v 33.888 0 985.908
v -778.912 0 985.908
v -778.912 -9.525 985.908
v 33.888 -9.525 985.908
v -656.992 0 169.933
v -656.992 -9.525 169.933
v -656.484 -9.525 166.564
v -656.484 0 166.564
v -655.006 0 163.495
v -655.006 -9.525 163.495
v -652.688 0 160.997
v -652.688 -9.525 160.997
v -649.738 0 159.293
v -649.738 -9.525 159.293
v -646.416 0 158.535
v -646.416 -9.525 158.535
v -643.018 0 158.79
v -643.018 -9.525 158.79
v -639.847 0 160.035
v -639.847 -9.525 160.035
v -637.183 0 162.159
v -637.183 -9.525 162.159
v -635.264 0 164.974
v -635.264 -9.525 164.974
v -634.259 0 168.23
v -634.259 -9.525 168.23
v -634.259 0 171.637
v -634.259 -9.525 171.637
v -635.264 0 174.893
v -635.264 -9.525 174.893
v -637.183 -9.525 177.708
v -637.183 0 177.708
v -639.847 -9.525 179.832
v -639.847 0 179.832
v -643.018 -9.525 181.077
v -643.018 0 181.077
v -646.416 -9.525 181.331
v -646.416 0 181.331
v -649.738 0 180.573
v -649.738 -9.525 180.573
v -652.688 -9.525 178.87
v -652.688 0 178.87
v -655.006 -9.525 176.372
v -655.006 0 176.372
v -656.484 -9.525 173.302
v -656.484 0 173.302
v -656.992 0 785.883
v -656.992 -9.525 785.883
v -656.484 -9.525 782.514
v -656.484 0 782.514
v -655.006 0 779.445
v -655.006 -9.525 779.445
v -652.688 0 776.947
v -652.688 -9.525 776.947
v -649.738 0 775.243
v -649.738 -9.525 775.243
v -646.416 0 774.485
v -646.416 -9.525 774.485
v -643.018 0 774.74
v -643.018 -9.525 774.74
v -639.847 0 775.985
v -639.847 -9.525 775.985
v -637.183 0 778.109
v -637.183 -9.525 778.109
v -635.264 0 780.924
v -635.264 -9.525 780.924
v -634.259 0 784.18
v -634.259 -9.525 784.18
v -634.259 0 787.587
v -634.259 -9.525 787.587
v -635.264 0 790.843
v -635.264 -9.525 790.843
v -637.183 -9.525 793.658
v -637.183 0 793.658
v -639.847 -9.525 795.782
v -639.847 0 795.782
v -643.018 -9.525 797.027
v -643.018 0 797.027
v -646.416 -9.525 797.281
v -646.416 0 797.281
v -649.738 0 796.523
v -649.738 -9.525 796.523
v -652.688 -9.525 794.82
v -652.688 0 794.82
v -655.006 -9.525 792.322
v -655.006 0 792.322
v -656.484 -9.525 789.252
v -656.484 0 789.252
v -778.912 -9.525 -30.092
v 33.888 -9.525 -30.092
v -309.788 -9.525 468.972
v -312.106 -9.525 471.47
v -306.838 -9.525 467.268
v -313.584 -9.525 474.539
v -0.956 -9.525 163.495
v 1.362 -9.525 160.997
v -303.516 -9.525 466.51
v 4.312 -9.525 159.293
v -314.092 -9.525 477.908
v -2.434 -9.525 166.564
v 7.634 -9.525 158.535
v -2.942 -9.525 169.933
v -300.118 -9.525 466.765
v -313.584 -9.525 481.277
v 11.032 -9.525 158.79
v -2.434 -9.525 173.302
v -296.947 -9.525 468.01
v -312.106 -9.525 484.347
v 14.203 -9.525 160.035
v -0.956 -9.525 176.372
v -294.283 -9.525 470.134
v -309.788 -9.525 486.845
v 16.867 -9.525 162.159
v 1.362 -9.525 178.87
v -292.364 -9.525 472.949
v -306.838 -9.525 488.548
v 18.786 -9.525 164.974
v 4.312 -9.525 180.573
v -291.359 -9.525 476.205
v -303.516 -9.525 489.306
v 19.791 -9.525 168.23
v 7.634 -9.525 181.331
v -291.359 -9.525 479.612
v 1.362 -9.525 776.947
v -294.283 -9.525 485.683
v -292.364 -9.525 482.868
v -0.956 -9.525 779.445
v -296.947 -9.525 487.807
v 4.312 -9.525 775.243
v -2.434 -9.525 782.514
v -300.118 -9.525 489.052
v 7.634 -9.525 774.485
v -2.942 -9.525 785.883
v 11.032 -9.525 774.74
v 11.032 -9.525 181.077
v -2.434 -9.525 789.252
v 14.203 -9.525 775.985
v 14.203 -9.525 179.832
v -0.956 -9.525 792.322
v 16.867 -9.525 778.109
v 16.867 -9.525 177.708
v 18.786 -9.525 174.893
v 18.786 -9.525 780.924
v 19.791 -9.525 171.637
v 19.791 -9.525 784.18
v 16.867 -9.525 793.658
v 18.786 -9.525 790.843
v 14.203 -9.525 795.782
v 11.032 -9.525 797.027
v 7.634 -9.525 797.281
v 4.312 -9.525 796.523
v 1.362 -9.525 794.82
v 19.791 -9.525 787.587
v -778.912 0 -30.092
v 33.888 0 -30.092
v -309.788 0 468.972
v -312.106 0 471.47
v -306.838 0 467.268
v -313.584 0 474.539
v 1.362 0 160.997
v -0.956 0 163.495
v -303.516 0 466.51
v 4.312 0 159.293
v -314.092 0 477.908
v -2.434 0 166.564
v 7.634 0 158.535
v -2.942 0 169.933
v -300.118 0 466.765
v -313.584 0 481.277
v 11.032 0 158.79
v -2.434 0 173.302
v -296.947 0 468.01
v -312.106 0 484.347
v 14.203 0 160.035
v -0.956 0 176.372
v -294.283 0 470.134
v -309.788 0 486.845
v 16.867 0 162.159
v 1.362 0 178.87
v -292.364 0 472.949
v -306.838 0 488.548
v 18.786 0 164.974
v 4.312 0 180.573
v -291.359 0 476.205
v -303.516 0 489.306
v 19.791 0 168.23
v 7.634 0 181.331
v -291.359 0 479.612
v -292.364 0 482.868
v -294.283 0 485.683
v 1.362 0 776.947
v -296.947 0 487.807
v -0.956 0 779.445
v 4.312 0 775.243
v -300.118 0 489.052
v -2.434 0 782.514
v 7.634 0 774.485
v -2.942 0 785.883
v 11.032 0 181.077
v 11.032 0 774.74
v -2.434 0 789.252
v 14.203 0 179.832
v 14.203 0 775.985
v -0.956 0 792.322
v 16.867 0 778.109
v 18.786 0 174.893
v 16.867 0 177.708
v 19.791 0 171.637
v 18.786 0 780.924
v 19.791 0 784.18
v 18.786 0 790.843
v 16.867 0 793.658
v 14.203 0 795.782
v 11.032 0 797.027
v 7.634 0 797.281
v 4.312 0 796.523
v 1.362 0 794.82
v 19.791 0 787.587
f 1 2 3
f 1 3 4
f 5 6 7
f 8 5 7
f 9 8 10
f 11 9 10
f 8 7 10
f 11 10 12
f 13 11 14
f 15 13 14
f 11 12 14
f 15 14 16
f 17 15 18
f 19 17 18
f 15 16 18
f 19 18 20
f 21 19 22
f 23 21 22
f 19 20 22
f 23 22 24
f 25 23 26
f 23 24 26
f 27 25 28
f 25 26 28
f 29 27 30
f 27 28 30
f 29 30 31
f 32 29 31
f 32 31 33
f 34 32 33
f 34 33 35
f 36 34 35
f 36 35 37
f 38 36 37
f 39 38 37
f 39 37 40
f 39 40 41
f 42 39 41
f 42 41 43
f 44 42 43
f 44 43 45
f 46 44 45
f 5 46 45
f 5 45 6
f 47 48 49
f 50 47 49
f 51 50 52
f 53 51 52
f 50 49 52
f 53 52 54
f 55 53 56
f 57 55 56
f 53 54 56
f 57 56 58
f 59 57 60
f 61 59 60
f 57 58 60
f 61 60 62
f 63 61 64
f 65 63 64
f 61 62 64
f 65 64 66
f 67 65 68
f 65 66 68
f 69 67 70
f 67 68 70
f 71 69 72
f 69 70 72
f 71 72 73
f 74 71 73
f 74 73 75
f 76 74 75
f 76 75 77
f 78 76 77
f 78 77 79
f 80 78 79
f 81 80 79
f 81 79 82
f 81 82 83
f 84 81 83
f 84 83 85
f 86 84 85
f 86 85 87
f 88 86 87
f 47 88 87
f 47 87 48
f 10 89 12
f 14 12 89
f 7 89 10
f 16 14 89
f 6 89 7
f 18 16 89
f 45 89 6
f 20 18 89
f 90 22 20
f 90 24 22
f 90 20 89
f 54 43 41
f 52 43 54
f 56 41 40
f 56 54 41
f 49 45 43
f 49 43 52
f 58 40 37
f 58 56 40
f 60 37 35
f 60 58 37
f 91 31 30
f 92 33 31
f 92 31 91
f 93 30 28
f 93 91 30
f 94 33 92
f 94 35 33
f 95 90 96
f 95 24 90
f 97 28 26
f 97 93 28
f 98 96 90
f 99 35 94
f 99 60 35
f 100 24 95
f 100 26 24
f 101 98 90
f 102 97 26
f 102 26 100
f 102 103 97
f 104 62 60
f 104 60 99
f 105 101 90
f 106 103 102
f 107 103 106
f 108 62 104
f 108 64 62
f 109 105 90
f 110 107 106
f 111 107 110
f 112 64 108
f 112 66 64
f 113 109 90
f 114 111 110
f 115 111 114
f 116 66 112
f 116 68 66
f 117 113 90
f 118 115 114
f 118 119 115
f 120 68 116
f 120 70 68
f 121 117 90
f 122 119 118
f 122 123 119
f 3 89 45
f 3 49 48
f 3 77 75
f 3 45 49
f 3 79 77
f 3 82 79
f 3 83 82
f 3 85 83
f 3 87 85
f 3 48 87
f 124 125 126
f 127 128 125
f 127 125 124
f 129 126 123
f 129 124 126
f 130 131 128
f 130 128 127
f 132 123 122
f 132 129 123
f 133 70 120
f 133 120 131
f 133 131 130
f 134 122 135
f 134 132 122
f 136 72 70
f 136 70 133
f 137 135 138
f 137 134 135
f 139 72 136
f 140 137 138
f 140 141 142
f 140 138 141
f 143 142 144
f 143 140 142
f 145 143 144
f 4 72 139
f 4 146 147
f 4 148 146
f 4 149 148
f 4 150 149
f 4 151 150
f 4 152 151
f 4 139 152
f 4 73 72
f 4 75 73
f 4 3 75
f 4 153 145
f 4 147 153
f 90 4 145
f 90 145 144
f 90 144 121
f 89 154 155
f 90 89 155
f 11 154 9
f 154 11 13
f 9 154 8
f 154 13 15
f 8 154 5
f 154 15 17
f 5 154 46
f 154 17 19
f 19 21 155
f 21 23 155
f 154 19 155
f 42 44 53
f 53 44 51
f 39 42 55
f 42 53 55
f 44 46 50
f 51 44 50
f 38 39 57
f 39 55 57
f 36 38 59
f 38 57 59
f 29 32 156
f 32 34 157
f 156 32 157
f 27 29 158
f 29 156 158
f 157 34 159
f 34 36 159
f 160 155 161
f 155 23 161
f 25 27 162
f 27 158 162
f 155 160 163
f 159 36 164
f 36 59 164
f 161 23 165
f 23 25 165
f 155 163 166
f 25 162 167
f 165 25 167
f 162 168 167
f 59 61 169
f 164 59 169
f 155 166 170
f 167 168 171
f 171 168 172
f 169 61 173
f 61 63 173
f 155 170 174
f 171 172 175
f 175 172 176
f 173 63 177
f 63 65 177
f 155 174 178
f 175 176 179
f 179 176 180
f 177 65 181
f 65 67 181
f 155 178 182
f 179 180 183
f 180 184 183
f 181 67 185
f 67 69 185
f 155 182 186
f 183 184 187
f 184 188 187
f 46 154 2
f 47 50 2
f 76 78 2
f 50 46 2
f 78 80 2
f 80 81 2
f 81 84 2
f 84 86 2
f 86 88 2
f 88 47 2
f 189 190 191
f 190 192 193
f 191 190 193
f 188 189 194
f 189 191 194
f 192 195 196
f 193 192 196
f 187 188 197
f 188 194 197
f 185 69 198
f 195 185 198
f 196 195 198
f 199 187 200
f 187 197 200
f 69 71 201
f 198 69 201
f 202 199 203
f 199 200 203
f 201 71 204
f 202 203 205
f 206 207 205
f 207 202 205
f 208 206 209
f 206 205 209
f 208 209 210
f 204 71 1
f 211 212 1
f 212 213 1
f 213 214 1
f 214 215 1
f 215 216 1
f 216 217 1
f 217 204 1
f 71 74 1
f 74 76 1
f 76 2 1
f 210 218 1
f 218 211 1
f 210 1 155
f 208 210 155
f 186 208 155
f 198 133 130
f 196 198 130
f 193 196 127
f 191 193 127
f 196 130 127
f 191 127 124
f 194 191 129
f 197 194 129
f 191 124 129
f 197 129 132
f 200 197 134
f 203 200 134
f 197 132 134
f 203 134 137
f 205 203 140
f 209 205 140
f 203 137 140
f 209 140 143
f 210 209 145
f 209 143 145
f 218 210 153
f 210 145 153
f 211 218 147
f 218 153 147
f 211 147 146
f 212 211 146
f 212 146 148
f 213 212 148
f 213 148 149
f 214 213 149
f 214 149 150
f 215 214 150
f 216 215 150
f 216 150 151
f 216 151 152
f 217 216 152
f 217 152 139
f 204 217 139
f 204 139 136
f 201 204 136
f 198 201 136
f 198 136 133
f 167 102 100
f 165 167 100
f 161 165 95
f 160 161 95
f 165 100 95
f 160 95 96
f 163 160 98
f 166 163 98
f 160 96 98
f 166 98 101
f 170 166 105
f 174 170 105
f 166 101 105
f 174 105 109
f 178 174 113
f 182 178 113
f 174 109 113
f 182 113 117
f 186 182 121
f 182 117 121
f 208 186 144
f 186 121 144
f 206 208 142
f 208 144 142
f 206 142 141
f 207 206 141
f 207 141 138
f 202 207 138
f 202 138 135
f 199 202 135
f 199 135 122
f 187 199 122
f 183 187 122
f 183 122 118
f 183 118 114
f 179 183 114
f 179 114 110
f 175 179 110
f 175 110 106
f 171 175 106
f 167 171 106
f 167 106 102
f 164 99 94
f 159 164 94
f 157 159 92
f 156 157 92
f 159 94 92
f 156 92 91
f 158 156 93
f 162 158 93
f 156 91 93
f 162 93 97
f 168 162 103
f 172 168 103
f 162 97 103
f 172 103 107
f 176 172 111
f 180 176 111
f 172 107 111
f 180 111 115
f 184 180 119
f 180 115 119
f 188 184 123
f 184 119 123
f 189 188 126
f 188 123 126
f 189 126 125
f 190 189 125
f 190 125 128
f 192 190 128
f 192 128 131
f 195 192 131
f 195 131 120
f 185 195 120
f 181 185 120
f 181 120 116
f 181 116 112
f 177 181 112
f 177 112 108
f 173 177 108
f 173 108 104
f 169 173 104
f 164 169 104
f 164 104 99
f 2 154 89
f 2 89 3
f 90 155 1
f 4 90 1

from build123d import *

# Parameters (mm, degrees)
F0_W     = 812.8
F0_H     = 1016
F1_DEPTH = 9.525
F3_D     = 22.86


with BuildPart() as f1:
    # F0 (on Front) → F1 (new body)
    with BuildSketch(Plane.XZ):
        with Locations((-372.5117605865, 477.9083641171)):
            Rectangle(F0_W, F0_H)
    extrude(amount=F1_DEPTH)

    # F3 (through all)
    with Locations(Plane(origin=(0, 0, 0), x_dir=(1, 0, 0), z_dir=(0, 1, 0))):
        with Locations((-645.5617605865, -785.8833641171), (8.4882394135, -785.8833641171), (-302.6617605865, -477.9083641171), (8.4882394135, -169.9333641171), (-645.5617605865, -169.9333641171)):
            Hole(F3_D / 2)


solid = f1.part
